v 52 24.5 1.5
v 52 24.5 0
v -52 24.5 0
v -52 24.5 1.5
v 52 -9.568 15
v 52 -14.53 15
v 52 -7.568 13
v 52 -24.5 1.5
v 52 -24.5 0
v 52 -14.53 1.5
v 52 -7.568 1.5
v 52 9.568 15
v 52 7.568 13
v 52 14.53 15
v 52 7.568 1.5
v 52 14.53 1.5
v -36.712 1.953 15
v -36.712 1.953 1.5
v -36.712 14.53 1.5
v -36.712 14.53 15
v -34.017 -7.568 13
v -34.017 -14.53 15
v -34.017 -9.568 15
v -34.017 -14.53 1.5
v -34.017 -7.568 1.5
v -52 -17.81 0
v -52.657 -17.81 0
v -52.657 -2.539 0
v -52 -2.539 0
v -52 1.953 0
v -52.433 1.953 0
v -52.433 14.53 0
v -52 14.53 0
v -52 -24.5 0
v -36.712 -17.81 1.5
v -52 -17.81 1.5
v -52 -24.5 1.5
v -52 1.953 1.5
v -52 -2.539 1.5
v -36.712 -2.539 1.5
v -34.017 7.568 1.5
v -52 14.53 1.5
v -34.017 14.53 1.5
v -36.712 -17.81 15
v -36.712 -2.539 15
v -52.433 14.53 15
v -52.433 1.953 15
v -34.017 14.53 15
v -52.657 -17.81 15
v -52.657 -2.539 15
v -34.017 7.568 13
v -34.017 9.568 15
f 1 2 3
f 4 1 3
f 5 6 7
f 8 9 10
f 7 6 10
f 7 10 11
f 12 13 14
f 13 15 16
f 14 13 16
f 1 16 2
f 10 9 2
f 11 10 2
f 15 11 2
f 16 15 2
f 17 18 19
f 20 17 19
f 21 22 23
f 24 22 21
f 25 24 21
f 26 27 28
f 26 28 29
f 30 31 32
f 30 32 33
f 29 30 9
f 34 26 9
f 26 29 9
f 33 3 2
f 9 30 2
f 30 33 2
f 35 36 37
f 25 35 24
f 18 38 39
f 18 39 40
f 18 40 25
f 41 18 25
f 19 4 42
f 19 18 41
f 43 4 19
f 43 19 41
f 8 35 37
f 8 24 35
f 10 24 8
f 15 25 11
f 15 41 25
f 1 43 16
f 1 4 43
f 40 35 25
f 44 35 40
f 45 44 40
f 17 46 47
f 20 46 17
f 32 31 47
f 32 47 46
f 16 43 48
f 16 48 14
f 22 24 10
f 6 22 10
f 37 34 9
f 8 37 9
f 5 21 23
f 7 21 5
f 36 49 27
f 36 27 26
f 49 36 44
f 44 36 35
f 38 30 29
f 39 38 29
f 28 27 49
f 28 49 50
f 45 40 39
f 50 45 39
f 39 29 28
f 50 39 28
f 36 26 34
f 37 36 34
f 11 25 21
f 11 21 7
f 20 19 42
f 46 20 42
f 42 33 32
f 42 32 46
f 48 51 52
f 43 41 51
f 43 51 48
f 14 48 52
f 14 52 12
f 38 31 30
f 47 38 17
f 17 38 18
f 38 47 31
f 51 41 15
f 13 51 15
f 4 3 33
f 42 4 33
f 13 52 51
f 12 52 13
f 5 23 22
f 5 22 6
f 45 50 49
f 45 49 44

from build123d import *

# Parameters (mm, degrees)
F0_W     = 15.2882066071
F0_H     = 15.2716501616
F0_H_2   = 12.5766545534
F0_W_2   = 86.0167954564
F0_H_3   = 6.9620762952
F1_DEPTH = 1.5
F0_W_3   = 0.6571944356
F0_W_4   = 0.4326078594
F2_DEPTH = 15
F3_SIZE  = 2


with BuildPart() as f1:
    # F0 (on Top) → F1 (new body)
    with BuildSketch(Plane.XY):
        Polygon((52, 14.529729262), (52, 24.5), (-52, 24.5), (-52, 14.529729262), (-36.7117933929, 14.529729262), (-36.7117933929, 1.9530747086), (-52, 1.9530747086), (-52, -2.5385871995), (-36.7117933929, -2.5385871995), (-36.7117933929, -17.8102373611), (-52, -17.8102373611), (-52, -24.5), (52, -24.5), (52, -14.529729262), (-34.0167954564, -14.529729262), (-34.0167954564, -7.5676529668), (52, -7.5676529668), (52, 7.5676529668), (-34.0167954564, 7.5676529668), (-34.0167954564, 14.529729262), align=None)
        with Locations((-44.3558966964, -10.1744122803)):
            Rectangle(F0_W, F0_H)
        with Locations((-44.3558966964, 8.2414019853)):
            Rectangle(F0_W, F0_H_2)
        with Locations((8.9916022718, 11.0486911144)):
            Rectangle(F0_W_2, F0_H_3)
        with Locations((8.9916022718, -11.0486911144)):
            Rectangle(F0_W_2, F0_H_3)
    extrude(amount=F1_DEPTH)

    # F0 (on Top) → F2 (join)
    with BuildSketch(Plane.XY):
        with Locations((-44.3558966964, 8.2414019853)):
            Rectangle(F0_W, F0_H_2)
        with Locations((-44.3558966964, -10.1744122803)):
            Rectangle(F0_W, F0_H)
        with Locations((-52.3285972178, -10.1744122803)):
            Rectangle(F0_W_3, F0_H)
        with Locations((-52.2163039297, 8.2414019853)):
            Rectangle(F0_W_4, F0_H_2)
        with Locations((8.9916022718, 11.0486911144)):
            Rectangle(F0_W_2, F0_H_3)
        with Locations((8.9916022718, -11.0486911144)):
            Rectangle(F0_W_2, F0_H_3)
    extrude(amount=F2_DEPTH)

    # F3
    f3_edges = [f1.edges().sort_by_distance(p)[0] for p in [
        (8.991602, -7.567653, 15),
        (8.991602, 7.567653, 15),
    ]]
    chamfer(f3_edges, length=F3_SIZE)


solid = f1.part
